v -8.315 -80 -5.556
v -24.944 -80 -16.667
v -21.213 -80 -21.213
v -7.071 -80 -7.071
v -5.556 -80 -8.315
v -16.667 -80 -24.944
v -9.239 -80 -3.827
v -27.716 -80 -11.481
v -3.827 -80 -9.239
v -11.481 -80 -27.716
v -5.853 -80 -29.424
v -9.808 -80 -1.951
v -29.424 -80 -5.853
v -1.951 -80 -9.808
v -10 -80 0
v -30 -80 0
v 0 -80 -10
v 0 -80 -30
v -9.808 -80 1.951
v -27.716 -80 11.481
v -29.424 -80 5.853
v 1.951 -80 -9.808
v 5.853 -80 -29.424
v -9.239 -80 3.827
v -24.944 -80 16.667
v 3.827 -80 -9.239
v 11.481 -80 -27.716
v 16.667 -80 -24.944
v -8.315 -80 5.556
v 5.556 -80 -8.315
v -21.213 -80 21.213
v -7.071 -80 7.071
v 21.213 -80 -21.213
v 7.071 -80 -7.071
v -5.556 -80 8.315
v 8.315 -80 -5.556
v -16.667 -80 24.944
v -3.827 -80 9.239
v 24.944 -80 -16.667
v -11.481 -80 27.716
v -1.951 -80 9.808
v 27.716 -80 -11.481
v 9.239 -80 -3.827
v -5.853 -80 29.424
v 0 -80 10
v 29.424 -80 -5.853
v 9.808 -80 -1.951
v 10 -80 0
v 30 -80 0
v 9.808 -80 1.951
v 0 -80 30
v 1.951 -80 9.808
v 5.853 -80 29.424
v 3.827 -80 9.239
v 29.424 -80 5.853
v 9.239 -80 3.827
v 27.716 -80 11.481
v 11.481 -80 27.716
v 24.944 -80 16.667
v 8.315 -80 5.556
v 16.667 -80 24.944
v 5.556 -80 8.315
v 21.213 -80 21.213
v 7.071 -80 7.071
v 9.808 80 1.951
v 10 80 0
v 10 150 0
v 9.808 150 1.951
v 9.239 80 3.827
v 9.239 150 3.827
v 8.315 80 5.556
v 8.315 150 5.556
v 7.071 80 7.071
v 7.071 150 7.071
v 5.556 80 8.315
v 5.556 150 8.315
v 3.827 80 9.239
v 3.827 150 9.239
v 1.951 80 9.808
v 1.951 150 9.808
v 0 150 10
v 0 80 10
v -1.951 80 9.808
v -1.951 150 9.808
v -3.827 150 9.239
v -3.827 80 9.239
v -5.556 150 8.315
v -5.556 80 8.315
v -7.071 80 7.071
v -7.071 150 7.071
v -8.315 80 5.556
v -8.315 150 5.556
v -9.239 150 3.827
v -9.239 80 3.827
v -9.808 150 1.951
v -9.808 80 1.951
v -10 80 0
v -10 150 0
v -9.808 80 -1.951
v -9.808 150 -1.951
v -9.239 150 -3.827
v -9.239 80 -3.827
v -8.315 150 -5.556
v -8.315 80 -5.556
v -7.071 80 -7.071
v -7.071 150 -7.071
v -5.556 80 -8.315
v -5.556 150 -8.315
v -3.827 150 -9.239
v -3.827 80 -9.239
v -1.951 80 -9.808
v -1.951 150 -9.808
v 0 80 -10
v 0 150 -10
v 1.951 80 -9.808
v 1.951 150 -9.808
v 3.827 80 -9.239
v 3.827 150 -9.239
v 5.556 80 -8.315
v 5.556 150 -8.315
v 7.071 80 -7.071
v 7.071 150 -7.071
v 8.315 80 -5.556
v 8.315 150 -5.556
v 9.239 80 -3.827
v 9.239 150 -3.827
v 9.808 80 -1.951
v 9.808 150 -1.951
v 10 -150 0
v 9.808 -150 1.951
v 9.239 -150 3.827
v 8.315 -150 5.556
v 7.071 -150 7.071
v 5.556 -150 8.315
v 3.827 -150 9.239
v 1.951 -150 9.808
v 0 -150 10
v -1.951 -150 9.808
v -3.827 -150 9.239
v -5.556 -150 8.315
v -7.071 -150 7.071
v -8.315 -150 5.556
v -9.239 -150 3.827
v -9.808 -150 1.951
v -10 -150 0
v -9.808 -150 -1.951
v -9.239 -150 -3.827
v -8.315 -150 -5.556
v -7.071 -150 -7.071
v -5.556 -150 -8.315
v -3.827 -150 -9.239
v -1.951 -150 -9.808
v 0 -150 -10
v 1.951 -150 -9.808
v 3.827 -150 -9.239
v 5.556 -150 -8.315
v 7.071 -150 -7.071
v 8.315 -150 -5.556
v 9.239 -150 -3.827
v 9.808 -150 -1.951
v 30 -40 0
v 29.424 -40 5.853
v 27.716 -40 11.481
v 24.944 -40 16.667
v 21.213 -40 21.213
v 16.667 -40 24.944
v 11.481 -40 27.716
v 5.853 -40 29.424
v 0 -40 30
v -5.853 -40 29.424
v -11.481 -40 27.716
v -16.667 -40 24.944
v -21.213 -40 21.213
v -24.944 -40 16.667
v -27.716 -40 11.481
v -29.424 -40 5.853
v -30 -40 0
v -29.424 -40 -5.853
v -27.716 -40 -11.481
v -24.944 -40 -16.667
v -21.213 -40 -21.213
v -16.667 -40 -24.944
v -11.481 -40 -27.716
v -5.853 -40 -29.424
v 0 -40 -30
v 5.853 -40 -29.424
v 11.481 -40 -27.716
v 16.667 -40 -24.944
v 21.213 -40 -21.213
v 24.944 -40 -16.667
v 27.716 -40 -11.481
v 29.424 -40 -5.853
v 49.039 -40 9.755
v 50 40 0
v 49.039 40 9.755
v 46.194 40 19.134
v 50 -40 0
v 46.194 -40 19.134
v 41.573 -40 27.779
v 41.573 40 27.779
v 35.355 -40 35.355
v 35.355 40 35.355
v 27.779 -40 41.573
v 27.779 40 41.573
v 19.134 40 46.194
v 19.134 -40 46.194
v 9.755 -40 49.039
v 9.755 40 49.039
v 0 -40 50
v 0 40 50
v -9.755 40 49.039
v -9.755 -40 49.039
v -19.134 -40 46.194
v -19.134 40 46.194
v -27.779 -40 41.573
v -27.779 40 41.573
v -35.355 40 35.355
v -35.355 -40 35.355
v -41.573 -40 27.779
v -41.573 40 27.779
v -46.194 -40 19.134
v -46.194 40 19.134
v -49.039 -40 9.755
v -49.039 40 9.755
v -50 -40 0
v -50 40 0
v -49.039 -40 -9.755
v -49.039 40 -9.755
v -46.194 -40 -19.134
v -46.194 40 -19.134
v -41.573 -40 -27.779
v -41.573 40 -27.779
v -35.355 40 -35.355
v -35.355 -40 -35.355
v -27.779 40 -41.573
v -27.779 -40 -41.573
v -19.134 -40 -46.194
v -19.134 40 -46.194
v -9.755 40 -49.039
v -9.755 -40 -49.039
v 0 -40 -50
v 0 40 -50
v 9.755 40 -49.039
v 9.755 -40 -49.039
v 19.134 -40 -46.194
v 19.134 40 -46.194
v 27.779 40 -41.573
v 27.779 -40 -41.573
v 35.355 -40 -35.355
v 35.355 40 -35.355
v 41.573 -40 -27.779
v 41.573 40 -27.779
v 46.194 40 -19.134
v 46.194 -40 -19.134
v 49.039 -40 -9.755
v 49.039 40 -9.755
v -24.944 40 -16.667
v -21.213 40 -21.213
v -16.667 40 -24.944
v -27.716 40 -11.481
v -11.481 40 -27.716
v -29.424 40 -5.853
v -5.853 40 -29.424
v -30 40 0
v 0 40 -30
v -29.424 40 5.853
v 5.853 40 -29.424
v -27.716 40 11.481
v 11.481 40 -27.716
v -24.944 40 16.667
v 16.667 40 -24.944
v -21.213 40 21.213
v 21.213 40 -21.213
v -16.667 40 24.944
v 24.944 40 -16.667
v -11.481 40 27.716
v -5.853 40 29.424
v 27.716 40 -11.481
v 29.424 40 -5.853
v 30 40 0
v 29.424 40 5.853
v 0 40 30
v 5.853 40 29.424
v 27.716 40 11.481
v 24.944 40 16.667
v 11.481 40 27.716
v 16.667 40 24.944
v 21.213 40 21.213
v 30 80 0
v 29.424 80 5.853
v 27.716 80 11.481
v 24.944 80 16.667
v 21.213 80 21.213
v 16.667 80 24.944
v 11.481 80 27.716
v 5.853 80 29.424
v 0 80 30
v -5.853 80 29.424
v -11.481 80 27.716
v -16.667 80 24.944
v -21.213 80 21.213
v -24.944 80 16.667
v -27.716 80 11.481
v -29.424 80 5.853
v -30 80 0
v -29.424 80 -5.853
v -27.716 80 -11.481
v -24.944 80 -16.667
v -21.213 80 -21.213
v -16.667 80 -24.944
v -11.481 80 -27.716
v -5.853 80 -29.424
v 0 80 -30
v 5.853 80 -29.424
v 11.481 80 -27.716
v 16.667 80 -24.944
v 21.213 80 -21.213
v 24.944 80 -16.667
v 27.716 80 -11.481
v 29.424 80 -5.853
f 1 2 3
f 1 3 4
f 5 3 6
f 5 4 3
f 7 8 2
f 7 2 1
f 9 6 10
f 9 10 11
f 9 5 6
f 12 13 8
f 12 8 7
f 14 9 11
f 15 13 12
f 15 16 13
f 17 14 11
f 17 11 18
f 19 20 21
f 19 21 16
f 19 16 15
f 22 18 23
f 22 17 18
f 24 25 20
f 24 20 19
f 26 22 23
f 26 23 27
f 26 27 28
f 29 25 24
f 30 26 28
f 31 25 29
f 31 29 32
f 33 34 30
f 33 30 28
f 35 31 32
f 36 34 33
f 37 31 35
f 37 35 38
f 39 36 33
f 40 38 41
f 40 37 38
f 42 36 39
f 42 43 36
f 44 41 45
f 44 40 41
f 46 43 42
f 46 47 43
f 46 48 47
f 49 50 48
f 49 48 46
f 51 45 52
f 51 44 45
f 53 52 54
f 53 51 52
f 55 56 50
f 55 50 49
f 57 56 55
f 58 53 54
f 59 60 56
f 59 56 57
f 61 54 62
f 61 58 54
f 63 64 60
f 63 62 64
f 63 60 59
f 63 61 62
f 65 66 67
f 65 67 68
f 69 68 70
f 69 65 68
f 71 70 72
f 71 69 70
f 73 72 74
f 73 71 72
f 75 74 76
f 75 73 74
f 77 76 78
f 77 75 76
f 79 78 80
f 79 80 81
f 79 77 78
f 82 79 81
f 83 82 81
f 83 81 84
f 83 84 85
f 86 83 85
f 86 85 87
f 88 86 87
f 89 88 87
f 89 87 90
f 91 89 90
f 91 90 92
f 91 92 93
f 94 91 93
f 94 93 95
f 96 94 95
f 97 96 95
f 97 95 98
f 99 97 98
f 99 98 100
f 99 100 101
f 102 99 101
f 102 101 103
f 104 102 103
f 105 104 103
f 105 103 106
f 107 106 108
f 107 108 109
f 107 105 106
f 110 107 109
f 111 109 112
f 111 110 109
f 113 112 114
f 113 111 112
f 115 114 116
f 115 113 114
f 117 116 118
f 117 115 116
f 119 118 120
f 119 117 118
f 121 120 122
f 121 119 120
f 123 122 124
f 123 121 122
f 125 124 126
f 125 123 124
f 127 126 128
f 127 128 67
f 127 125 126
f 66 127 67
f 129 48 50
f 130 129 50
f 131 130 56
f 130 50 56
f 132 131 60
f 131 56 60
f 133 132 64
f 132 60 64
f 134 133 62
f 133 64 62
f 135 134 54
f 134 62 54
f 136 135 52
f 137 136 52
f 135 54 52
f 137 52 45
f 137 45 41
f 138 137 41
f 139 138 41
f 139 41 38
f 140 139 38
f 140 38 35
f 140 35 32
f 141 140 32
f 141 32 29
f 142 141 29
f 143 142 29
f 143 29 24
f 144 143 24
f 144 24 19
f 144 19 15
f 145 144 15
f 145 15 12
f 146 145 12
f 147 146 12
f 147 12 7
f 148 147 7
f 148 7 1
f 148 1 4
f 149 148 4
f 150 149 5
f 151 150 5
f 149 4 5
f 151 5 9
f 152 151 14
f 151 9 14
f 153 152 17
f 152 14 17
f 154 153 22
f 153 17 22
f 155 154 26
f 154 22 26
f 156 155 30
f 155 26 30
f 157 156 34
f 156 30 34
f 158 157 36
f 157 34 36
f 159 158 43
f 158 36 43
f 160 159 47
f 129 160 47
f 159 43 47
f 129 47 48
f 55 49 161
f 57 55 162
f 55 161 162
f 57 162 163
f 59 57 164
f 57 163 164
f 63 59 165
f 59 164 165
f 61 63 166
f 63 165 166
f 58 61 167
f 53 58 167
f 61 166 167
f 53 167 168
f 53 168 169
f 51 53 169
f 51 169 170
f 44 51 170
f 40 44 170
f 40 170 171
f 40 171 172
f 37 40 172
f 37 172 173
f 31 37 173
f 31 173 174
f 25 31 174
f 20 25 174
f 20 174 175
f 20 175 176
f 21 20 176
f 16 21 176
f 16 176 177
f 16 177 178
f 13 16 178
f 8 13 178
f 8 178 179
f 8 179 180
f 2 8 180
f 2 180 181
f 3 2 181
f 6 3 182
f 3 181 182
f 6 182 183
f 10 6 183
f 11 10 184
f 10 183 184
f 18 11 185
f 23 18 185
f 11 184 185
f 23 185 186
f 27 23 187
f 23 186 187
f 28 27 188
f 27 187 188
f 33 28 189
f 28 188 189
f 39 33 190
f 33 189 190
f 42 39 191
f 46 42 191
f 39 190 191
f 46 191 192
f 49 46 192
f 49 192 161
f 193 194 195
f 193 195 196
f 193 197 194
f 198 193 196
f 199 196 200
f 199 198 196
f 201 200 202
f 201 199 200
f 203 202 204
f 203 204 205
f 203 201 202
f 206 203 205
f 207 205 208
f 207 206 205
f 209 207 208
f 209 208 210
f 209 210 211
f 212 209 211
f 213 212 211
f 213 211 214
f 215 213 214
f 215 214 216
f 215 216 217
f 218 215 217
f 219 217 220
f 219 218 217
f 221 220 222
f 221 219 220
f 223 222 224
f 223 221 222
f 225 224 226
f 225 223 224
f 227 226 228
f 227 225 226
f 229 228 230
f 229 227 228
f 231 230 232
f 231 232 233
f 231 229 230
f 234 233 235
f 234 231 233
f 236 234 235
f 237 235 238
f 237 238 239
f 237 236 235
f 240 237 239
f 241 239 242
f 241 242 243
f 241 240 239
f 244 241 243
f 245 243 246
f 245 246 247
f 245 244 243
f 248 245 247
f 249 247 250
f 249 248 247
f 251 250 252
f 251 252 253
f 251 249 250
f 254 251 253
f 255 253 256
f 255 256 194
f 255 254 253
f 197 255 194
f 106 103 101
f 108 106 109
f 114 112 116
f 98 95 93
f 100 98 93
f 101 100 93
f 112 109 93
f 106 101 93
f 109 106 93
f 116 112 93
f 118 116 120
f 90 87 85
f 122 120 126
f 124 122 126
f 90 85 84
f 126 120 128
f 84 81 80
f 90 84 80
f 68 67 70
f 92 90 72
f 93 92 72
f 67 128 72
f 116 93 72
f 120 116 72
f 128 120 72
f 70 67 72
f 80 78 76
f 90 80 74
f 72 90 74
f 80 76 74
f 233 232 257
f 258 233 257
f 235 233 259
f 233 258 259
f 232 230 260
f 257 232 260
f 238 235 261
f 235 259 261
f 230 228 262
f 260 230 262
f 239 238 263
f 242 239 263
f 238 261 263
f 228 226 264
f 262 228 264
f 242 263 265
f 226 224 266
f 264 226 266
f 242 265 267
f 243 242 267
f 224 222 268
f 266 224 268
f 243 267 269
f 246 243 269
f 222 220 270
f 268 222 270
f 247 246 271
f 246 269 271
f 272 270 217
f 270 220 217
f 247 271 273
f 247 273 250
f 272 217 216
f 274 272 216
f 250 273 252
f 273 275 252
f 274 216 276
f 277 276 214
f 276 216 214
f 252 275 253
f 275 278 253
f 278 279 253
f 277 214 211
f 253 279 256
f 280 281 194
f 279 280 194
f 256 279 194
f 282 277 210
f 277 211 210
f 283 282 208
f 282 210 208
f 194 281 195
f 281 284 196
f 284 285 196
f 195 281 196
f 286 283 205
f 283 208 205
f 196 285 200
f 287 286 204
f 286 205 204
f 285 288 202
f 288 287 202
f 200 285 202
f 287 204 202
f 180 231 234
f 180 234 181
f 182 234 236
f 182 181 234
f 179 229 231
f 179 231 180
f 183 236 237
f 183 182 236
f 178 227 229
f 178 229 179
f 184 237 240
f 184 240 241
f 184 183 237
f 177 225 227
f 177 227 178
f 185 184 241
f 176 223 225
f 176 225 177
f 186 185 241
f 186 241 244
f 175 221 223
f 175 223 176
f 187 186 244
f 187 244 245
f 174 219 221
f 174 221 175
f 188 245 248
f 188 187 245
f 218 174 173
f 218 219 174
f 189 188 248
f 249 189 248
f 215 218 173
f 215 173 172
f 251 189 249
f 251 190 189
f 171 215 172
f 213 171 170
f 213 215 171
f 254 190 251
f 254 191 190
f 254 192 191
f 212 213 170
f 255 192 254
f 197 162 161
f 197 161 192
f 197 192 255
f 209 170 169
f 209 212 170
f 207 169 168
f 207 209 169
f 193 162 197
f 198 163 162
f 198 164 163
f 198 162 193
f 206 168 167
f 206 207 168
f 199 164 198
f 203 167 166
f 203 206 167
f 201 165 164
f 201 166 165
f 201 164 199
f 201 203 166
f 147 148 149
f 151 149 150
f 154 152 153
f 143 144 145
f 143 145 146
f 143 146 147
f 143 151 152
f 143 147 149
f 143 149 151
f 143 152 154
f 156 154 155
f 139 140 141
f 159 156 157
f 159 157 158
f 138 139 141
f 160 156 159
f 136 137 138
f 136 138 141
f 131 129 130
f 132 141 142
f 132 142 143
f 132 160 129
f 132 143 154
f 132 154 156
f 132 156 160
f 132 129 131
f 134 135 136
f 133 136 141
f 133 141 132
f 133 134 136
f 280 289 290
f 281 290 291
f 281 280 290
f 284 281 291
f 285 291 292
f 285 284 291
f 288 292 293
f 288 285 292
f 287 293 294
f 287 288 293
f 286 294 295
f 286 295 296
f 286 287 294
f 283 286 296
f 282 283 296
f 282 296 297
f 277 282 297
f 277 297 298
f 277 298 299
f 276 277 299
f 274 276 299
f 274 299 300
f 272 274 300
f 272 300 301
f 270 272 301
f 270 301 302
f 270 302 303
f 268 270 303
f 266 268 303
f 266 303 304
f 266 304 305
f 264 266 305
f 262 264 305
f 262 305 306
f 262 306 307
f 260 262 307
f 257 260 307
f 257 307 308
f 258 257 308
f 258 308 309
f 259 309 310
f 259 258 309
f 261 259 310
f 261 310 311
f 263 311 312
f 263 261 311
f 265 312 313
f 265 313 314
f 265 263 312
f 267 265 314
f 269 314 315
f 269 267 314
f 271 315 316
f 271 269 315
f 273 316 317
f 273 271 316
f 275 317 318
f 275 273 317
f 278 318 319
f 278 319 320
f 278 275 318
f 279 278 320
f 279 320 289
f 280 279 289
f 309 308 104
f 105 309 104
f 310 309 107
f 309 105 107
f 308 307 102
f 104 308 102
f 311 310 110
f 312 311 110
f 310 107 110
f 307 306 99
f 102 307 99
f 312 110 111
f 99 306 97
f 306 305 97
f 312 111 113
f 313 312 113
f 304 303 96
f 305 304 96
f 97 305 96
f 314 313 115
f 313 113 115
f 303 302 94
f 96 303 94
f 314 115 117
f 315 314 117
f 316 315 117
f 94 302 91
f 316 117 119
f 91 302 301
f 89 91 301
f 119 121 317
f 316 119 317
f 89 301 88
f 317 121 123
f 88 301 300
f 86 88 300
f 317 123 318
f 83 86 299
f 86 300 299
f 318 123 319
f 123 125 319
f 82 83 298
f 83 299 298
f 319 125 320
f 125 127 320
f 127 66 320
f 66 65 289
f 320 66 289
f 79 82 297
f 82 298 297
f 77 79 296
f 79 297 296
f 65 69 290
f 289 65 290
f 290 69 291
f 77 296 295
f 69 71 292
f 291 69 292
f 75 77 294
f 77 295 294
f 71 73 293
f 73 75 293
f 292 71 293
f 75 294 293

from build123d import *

# Parameters (mm, degrees)
F0_R     = 10
F1_DEPTH = 150
F0_R_2   = 30
F2_DEPTH = 80
F0_R_3   = 50
F3_DEPTH = 40


with BuildPart() as f1:
    # F0 (on Front) → F1 (new body)
    with BuildSketch(Plane.XZ):
        Circle(F0_R)
    extrude(amount=F1_DEPTH)

    # F0 (on Front) → F2 (join)
    with BuildSketch(Plane.XZ):
        Circle(F0_R_2)
        Circle(F0_R, mode=Mode.SUBTRACT)
    extrude(amount=F2_DEPTH)

    # F0 (on Front) → F3 (join)
    with BuildSketch(Plane.XZ):
        Circle(F0_R_3)
        Circle(F0_R_2, mode=Mode.SUBTRACT)
    extrude(amount=F3_DEPTH)

    # F4: F1 across plane


with BuildPart() as f1_1:
    add(f1.part)
    add(f1.part.mirror(Plane.XZ))


solid = f1_1.part
